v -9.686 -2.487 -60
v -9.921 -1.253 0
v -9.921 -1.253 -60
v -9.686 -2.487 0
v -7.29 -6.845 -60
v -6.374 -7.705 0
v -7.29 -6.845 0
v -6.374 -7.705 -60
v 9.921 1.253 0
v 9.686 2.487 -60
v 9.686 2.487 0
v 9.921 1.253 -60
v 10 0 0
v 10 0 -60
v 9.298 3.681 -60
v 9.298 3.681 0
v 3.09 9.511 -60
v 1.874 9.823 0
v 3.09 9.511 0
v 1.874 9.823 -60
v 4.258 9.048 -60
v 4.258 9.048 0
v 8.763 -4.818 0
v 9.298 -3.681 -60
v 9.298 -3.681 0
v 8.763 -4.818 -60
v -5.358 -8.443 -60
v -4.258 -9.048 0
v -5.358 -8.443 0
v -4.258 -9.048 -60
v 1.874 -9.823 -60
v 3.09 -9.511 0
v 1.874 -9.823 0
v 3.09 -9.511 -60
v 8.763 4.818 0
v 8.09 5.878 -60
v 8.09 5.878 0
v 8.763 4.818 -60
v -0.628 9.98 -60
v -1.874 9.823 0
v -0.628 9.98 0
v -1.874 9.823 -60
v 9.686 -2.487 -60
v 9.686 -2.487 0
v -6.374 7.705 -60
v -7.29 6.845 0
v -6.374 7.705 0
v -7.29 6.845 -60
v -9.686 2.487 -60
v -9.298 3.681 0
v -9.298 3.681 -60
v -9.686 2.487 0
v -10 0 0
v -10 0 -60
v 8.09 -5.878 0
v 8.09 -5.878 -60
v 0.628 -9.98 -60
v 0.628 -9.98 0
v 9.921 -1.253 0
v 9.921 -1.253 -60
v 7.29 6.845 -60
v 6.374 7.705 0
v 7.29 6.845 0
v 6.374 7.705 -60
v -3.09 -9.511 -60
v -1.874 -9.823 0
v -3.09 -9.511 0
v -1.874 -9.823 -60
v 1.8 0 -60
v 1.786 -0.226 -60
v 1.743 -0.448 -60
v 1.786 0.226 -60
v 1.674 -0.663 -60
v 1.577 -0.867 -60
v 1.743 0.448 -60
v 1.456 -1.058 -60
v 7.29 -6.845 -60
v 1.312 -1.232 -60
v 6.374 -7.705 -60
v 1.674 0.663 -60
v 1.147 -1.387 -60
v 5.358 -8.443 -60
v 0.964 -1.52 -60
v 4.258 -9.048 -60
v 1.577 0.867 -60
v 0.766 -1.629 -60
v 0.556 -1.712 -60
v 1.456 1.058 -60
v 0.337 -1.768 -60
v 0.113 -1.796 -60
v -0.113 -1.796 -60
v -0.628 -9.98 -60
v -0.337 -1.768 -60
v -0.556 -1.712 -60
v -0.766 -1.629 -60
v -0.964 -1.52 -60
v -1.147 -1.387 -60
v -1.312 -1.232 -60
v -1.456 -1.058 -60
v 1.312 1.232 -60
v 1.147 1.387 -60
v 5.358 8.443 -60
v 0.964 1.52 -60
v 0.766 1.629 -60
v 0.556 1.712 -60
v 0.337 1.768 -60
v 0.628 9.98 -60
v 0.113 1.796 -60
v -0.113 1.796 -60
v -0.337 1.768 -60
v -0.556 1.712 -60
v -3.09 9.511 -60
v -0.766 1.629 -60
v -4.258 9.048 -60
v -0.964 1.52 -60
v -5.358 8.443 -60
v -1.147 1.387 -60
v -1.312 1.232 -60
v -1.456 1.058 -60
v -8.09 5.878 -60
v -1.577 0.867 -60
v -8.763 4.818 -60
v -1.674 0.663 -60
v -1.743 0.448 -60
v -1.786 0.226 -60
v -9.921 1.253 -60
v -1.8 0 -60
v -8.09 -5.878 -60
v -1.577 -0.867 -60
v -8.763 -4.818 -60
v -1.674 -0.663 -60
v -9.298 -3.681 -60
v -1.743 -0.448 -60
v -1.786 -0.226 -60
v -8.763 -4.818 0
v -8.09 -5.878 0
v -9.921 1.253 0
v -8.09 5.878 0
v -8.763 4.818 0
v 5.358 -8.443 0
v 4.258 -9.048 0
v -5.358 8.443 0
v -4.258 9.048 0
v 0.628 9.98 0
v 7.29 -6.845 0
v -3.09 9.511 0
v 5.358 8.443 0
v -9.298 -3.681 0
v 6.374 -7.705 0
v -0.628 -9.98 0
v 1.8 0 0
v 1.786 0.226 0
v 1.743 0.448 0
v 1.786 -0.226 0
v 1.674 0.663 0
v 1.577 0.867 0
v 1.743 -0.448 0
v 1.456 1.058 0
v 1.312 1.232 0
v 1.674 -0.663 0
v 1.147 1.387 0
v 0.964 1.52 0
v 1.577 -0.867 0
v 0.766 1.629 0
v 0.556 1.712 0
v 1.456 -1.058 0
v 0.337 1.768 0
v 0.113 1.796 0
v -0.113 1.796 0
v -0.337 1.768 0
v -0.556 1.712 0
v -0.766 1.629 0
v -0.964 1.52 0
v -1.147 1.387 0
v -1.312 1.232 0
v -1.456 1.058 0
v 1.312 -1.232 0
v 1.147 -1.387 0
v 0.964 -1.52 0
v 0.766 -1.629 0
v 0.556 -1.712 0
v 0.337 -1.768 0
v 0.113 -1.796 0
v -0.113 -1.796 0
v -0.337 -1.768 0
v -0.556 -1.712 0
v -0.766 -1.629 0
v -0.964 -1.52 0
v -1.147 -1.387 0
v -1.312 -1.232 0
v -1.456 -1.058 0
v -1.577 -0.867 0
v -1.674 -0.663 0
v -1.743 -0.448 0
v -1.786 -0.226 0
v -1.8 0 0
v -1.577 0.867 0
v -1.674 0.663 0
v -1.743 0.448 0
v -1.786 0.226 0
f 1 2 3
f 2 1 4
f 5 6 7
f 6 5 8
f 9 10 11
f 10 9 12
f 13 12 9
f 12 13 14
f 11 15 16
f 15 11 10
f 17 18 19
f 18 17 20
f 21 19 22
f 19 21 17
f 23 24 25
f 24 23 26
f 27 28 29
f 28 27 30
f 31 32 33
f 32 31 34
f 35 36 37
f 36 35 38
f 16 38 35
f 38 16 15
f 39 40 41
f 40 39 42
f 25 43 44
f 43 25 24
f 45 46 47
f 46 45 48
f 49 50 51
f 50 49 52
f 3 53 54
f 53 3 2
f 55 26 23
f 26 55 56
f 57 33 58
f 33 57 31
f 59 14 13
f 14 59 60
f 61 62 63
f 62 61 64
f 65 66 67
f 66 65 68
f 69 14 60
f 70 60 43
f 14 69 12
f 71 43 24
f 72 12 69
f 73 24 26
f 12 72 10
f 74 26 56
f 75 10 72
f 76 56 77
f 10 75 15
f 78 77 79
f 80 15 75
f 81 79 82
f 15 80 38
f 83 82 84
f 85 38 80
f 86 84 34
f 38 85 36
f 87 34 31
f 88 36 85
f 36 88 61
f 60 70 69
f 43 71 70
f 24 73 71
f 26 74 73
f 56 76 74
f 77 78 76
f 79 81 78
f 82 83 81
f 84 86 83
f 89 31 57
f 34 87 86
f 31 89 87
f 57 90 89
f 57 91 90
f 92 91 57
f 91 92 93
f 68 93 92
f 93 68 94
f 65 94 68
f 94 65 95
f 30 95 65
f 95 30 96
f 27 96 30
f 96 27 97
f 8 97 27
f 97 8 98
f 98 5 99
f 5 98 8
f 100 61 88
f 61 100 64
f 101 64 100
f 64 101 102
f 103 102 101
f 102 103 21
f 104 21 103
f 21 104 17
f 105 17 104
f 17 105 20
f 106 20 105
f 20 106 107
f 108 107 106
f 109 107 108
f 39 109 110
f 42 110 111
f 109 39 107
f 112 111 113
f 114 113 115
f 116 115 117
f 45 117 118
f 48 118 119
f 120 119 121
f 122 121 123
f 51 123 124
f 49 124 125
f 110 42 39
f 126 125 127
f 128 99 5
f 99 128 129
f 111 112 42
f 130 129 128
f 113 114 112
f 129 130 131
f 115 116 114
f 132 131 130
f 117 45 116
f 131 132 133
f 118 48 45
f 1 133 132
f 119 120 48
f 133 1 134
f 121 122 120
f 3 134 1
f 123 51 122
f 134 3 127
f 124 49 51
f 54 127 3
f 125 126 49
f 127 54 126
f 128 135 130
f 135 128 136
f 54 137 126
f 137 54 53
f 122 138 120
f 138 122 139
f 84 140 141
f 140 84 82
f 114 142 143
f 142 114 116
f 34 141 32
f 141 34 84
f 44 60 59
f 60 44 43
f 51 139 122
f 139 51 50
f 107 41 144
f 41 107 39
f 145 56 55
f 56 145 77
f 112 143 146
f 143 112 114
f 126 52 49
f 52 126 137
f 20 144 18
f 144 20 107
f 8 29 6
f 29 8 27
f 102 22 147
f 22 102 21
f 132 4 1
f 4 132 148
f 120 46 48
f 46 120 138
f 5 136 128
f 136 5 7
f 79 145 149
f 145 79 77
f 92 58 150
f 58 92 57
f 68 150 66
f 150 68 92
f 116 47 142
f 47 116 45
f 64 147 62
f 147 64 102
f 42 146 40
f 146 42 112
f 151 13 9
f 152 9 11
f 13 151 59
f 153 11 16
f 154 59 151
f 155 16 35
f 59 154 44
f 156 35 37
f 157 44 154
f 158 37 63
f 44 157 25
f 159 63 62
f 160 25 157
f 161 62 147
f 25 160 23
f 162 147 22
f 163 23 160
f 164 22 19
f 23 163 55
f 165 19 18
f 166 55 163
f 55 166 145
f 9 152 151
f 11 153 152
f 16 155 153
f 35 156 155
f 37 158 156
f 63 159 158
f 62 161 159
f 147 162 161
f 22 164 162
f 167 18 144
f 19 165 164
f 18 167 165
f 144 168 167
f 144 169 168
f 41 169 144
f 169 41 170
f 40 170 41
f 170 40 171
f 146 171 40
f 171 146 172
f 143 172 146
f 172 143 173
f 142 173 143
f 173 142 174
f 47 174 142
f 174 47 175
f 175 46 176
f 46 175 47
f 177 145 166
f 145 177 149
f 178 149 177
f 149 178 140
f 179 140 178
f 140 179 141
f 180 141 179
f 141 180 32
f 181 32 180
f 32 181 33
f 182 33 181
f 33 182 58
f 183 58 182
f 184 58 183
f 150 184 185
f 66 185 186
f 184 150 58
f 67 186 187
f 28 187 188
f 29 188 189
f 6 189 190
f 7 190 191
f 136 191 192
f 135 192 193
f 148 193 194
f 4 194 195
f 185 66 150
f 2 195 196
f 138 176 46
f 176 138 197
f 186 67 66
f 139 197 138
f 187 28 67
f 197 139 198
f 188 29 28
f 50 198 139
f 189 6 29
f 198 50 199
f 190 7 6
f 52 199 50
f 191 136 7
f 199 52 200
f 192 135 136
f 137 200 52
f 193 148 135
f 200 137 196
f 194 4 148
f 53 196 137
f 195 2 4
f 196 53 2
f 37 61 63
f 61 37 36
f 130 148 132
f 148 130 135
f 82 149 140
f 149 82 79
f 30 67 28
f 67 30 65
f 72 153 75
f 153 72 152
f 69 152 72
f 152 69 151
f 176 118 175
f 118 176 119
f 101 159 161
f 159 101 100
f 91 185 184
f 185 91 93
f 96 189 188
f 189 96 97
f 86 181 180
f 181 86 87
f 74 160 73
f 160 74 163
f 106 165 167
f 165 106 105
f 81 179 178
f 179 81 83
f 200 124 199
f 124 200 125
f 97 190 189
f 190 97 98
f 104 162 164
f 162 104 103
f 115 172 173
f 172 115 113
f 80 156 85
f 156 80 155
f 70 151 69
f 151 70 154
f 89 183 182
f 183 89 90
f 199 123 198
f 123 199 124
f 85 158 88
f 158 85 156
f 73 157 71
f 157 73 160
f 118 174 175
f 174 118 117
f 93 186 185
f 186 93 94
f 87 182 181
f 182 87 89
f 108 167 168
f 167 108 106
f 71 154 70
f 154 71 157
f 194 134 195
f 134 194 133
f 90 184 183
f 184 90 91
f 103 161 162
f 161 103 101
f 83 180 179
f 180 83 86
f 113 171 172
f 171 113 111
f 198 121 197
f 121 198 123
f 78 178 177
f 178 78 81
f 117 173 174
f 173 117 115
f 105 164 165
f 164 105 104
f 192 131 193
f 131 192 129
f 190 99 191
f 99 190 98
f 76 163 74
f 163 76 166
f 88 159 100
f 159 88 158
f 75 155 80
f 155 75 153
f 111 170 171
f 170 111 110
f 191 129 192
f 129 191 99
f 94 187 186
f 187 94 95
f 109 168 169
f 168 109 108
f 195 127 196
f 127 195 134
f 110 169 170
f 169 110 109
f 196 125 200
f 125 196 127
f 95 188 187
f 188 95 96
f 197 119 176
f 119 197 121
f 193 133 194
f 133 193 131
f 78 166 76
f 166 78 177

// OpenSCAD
$fn = 50;


difference() {
	union() {
		translate(v = [0, 0, -60.0000000000]) {
			cylinder(h = 60, r = 10.0000000000);
		}
		cylinder(h = 0, r = 16.0000000000);
	}
	union() {
		#translate(v = [0, 0, -60]) {
			cylinder(h = 60, r = 1.8000000000);
		}
	}
}
